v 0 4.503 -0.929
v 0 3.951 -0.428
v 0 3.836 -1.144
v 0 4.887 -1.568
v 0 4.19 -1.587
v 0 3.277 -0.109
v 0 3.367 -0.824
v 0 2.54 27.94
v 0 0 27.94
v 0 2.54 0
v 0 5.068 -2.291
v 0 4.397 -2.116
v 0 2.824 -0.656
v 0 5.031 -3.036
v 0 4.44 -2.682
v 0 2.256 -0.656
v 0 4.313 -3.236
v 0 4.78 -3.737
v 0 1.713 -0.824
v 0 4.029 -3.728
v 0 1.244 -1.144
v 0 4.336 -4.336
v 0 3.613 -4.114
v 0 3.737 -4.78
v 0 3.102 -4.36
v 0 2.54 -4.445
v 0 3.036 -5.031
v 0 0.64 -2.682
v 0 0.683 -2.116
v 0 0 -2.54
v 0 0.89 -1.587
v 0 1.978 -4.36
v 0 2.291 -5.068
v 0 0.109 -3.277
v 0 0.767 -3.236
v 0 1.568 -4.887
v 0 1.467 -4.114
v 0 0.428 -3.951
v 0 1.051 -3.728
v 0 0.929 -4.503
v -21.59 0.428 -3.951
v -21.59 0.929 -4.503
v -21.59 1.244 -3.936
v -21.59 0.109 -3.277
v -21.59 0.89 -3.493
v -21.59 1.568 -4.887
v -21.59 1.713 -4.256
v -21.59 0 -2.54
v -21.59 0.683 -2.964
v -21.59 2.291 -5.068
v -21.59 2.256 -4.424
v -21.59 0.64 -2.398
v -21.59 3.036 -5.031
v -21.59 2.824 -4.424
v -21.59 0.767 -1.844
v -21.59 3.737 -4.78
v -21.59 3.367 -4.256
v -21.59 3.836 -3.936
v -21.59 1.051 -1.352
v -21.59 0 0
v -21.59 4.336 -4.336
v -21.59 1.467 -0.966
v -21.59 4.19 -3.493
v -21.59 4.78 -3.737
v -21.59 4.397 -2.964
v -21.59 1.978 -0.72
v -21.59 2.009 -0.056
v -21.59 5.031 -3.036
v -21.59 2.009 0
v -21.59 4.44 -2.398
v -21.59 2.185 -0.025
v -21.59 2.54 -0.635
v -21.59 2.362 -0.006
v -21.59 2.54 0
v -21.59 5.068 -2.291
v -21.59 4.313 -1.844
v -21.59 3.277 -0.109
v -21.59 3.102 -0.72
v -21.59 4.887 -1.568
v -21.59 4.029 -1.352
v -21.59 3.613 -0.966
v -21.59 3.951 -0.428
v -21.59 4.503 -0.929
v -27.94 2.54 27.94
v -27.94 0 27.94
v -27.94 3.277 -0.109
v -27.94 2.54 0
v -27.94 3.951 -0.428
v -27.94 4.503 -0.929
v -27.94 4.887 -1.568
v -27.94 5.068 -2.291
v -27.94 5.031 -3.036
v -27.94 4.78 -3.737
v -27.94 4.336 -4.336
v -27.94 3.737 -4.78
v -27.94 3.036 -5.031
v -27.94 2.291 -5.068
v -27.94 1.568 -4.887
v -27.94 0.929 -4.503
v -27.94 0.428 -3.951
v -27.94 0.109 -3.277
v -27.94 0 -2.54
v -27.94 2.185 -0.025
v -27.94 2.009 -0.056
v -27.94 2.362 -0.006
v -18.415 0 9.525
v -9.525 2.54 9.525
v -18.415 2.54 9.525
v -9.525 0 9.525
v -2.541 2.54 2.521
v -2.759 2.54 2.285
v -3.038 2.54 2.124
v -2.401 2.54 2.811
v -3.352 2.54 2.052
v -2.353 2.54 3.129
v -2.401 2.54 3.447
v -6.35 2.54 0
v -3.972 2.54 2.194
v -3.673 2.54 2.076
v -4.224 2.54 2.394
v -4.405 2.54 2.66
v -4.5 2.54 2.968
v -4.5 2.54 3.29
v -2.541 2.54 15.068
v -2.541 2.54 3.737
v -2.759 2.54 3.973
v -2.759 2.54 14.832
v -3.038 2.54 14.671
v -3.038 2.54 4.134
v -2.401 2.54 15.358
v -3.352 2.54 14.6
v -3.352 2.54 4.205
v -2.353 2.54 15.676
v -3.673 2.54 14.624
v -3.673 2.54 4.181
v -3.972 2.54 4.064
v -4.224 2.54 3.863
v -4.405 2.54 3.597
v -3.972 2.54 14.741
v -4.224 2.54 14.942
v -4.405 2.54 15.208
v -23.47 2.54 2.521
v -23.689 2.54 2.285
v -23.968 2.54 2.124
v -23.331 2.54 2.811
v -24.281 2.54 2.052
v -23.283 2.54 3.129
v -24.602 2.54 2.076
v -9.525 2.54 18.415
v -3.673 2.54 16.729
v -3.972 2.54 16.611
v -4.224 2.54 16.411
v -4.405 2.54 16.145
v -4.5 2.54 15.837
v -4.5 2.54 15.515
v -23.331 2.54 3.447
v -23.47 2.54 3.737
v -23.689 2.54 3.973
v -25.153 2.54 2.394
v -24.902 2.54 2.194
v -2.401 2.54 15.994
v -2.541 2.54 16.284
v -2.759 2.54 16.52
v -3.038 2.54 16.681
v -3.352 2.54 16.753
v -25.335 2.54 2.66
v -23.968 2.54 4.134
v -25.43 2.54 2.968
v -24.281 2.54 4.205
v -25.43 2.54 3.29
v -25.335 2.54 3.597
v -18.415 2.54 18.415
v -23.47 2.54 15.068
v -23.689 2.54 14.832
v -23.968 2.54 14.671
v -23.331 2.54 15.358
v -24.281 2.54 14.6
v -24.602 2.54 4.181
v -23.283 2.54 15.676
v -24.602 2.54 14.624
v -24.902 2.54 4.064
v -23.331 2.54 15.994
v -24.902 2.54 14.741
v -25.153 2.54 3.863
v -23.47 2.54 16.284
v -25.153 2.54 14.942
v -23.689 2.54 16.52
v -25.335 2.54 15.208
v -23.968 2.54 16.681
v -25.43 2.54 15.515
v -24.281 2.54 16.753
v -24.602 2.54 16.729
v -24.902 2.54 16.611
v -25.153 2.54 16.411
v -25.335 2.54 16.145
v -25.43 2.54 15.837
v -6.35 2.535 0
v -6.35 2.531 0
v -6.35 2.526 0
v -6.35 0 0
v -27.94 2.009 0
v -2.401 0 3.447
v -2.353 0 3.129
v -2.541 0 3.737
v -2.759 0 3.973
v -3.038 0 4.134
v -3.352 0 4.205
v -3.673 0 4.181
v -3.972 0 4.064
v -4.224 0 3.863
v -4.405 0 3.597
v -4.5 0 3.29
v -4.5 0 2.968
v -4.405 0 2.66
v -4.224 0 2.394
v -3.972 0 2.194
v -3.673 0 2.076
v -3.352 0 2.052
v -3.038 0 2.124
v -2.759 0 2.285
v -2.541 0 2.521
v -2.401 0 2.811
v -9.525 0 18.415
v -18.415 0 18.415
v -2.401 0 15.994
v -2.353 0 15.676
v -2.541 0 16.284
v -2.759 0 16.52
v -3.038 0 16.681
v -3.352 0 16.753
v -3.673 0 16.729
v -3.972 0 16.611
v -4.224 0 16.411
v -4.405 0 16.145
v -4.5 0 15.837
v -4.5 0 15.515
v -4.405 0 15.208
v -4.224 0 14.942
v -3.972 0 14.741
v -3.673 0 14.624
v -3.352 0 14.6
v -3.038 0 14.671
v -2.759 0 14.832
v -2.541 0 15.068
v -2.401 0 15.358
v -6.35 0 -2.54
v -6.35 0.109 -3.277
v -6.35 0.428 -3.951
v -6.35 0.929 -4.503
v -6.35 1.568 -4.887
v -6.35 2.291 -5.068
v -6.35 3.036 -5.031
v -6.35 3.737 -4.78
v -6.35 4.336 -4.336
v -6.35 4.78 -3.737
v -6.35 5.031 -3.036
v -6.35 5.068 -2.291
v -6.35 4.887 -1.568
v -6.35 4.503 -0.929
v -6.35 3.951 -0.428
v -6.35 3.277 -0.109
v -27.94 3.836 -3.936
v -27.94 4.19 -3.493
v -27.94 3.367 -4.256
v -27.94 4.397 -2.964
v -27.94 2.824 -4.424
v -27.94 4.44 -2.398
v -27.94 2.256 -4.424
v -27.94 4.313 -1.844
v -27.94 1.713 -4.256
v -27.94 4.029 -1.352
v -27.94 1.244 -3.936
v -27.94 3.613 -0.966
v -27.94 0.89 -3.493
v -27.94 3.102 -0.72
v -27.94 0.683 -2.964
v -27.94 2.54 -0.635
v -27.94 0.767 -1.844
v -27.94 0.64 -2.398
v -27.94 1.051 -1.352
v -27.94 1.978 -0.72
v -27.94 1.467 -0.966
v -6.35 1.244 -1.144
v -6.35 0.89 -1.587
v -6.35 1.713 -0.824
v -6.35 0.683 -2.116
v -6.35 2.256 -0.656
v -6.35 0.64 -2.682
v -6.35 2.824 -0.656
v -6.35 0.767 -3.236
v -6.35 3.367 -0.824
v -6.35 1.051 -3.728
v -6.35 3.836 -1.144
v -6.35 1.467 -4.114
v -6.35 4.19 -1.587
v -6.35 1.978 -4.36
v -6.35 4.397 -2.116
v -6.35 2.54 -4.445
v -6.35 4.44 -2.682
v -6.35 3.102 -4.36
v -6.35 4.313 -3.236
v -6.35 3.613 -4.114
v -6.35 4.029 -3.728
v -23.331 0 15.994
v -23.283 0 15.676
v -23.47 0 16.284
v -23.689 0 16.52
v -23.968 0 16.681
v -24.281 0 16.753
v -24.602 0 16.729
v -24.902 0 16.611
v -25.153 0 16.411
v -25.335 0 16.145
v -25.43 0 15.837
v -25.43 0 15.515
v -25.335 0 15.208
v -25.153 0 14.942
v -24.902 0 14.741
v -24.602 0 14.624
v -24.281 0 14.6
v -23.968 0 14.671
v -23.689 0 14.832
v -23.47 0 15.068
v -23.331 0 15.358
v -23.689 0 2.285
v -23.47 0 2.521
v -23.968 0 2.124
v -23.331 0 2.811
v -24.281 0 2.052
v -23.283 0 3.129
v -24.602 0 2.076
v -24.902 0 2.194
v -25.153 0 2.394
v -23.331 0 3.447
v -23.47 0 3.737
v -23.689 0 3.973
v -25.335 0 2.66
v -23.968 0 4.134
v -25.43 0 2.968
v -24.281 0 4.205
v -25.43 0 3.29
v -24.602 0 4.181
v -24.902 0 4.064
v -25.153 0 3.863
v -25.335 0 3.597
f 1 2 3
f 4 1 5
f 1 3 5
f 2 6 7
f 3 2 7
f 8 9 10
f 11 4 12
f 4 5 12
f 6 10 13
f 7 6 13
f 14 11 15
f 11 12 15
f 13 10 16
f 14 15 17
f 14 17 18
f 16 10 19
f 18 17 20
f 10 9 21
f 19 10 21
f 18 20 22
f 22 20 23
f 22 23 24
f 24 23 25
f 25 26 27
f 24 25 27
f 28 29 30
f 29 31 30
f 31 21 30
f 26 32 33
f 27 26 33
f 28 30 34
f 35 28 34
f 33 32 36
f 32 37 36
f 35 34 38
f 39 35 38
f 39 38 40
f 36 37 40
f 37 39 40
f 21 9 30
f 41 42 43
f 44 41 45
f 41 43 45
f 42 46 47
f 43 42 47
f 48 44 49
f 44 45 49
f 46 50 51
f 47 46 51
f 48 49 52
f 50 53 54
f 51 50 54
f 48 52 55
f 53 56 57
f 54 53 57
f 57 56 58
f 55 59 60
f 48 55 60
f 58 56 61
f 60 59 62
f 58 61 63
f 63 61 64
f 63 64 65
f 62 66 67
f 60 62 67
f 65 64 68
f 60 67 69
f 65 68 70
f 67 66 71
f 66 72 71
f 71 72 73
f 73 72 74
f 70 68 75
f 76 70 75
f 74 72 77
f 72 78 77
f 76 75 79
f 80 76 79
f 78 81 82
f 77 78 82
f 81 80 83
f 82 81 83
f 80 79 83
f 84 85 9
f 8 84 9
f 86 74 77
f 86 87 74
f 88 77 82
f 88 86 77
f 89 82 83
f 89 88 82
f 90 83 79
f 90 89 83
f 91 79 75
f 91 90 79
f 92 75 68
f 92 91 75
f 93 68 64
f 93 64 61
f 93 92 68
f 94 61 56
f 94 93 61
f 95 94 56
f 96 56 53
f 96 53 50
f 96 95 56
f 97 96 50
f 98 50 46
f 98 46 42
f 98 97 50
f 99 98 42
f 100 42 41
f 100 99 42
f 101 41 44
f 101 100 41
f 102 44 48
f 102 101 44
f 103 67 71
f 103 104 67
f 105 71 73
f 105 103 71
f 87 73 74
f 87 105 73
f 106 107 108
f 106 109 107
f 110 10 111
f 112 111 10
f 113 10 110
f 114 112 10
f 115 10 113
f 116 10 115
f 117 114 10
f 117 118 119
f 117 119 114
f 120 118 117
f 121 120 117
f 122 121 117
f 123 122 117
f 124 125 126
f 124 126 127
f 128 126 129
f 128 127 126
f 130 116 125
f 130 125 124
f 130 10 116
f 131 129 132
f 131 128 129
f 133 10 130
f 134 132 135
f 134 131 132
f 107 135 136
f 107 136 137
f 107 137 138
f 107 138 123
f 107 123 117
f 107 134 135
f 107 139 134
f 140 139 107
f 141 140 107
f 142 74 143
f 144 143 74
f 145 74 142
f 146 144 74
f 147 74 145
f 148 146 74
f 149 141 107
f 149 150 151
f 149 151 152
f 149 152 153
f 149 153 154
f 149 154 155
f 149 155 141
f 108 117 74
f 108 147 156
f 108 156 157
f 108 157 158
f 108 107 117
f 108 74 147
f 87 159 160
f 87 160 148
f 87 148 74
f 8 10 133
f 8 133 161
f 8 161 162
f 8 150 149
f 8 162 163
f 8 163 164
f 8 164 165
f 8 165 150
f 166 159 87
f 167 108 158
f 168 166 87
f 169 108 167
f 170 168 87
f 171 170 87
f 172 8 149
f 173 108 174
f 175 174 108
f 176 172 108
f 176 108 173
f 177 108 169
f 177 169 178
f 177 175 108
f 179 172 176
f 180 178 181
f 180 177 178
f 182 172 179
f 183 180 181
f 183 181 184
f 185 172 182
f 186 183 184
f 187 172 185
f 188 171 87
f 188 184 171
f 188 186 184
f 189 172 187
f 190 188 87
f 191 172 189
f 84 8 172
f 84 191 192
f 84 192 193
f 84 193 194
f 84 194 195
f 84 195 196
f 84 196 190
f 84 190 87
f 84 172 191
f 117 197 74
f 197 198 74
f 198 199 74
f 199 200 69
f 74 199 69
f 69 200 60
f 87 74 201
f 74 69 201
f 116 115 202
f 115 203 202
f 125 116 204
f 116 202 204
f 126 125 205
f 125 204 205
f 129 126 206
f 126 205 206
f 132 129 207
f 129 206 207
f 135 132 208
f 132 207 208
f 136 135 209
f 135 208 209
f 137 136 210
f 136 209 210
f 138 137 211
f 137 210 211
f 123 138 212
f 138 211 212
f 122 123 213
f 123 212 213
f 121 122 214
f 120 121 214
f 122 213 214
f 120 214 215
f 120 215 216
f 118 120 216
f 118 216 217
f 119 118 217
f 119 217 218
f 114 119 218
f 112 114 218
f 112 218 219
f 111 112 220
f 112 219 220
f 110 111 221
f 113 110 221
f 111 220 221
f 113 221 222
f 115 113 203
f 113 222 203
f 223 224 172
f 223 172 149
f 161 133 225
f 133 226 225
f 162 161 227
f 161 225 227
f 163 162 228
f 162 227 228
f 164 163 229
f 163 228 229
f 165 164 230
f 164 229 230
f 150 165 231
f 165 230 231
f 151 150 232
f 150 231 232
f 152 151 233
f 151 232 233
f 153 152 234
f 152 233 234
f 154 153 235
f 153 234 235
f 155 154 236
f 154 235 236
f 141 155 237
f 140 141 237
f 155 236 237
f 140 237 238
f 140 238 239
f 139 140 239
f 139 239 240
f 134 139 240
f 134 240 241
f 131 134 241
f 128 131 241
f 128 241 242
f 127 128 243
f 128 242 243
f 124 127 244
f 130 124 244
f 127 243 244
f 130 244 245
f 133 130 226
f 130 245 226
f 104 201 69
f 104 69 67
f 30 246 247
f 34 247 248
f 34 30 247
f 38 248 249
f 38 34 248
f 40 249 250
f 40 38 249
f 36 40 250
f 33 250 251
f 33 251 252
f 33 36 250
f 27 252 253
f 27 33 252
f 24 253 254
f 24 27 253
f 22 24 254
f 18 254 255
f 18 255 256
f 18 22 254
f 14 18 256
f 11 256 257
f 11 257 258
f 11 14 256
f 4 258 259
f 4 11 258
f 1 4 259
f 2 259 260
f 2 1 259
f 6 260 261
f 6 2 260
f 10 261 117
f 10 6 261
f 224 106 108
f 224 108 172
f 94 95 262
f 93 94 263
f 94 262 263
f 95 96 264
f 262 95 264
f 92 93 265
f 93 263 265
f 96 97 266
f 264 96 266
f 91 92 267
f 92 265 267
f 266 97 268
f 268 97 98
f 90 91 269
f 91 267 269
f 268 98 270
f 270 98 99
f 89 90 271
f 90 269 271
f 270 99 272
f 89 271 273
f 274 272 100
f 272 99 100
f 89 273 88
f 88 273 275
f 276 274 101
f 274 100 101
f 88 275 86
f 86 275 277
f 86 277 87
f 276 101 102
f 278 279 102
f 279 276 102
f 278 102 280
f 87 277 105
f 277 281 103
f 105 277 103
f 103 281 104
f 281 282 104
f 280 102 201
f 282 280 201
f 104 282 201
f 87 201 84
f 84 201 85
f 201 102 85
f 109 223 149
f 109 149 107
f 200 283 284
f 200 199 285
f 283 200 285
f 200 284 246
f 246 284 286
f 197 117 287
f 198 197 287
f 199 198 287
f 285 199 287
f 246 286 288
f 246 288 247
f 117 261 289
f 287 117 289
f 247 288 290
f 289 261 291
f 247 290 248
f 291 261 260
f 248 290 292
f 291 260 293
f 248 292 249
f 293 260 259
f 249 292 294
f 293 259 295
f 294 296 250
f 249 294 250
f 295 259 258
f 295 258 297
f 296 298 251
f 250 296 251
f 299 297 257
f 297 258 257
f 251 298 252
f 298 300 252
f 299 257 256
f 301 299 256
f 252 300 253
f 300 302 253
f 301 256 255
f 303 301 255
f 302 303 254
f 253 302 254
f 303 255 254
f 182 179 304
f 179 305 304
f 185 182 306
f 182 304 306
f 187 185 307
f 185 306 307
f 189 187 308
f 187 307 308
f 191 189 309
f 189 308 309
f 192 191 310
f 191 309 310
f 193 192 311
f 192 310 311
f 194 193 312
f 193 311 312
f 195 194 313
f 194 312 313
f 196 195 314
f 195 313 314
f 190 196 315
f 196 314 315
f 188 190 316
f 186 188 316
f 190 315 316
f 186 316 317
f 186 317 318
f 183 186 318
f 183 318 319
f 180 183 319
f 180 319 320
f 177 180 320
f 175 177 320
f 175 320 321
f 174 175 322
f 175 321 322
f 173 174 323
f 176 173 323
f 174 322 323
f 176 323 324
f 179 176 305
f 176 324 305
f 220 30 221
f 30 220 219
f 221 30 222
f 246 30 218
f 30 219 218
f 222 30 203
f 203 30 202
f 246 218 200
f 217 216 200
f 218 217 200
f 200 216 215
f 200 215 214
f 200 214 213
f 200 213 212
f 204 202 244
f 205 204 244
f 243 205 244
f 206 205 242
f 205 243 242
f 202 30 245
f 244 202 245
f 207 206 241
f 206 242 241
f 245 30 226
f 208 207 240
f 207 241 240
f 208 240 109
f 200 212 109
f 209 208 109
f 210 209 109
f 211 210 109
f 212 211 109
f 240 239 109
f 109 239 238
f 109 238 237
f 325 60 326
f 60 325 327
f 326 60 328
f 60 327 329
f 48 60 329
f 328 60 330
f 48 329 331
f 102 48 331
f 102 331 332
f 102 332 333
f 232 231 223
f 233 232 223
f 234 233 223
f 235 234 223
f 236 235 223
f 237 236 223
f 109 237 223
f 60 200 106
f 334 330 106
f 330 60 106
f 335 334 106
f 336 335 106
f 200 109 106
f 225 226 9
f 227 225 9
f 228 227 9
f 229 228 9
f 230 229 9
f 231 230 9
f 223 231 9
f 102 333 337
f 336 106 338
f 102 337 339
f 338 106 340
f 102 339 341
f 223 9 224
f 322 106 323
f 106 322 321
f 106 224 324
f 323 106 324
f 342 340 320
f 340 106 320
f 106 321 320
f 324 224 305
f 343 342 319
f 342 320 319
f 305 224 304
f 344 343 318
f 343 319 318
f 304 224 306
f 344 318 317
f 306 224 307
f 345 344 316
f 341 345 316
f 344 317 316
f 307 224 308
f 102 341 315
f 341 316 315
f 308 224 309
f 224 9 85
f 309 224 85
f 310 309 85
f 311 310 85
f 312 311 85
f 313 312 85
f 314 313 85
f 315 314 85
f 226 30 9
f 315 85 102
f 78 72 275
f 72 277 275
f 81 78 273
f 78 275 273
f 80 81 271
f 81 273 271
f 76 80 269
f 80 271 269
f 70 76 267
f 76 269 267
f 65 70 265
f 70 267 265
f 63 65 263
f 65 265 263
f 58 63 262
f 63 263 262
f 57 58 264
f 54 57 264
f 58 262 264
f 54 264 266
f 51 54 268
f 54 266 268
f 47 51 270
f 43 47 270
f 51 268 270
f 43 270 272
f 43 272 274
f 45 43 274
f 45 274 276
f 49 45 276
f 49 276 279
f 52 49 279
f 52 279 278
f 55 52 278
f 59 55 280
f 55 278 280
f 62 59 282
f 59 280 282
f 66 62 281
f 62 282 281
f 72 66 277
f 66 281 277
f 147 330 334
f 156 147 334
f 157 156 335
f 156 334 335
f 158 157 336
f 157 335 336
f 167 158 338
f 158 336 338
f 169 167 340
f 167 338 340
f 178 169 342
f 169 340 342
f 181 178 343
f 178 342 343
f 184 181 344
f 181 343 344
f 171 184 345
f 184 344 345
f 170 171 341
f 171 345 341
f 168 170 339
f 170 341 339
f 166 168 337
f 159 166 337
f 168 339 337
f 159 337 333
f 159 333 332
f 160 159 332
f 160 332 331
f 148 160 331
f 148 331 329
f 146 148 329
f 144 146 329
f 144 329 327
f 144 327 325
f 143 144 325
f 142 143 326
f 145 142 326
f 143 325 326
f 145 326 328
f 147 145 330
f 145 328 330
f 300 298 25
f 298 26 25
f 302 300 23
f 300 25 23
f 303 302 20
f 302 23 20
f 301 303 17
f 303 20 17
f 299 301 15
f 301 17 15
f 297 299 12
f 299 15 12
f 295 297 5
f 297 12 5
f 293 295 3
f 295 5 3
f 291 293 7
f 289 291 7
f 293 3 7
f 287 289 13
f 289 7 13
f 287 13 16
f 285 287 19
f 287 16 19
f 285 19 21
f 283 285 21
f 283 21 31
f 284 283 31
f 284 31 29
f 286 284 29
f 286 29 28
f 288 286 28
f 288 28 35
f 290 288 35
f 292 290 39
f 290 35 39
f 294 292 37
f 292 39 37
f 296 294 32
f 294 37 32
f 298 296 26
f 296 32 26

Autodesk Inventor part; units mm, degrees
ref_plane "YZ Plane" through (0, 0, 0) normal (1, 0, 0) x (0, 1, 0)
ref_plane "XZ Plane" through (0, 0, 0) normal (0, 1, 0) x (-1, 0, 0)
sketch "Sketch1" plane through (0, 0, 0) normal (0, 1, 0) x (-1, 0, 0)
  line L0 (0, 0) -> (27.94, 0)
  line L1 (27.94, 0) -> (27.94, 27.94)
  line L2 (27.94, 27.94) -> (0, 27.94)
  line L3 (0, 27.94) -> (0, 0)
  line L4 (18.415, 18.415) -> (9.525, 18.415)
  line L5 (9.525, 18.415) -> (9.525, 9.525)
  line L6 (9.525, 9.525) -> (18.415, 9.525)
  line L7 (18.415, 9.525) -> (18.415, 18.415)
  line L8 (27.94, 0) -> (18.415, 9.525)
  line L9 (9.525, 18.415) -> (0, 27.94)
  line L10 (27.94, 27.94) -> (18.415, 18.415)
  line L11 (9.525, 9.525) -> (0, 0)
  dimension "d0" = 27.94
  dimension "d1" = 8.89
extrude "Extrusion1" add sketch "Sketch1" along normal blind 2.54 contours L11 L6 L8 L0 | L3 L9 L5 L11 | L8 L7 L10 L1 | L2 L10 L4 L9
sketch "Sketch2" plane through (0, 0, 27.94) normal (1, 0, 0) x (0, 0, -1)
  circle A0 centre (30.48, 2.54) radius 2.54
  line L0 (27.94, 0) -> (30.48, 0)
  line L1 (27.94, 2.5262) -> (27.94, 0)
  circle A1 centre (30.48, 2.54) radius 1.905
  line L2 (0, 0) -> (27.94, 0) projected
  line L3 (27.94, 0) -> (27.94, 2.54) projected
  line L4 (27.94, 2.54) -> (27.94, 0)
  line L5 (27.94, 0) -> (30.48, 0)
  line L6 (27.94, 2.54) -> (28.575, 2.54)
  line L7 (28.575, 2.54) -> (28.575, 0)
  line L8 (28.575, 0) -> (27.94, 0)
  line L9 (27.94, 0) -> (27.94, 2.54)
  line L10 (30.48, 0.635) -> (27.94, 0.635)
  line L11 (27.94, 0.635) -> (27.94, 0)
  line L12 (27.94, 0) -> (30.48, 0)
  line L13 (30.48, 0) -> (30.48, 0.635)
  line L14 (28.9005, 1.0162) -> (28.3369, 1.0162)
  line L15 (28.3369, 1.0162) -> (28.3369, 0.4026)
  line L16 (28.3369, 0.4026) -> (28.9005, 0.4026)
  line L17 (28.9005, 0.4026) -> (28.9005, 1.0162)
  dimension "d4" = 5.08
  dimension "d5" = 3.81
sketch "Sketch3" plane through (-27.94, 0, 0) normal (-1, 0, 0) x (0, 0, 1)
  circle A0 centre (-2.54, 2.54) radius 1.905
  circle A1 centre (-2.54, 2.54) radius 2.54
  line L0 (-0.3403, 2.54) -> (-0.3403, 0)
  line L1 (0, 2.54) -> (0, 0) projected
  line L2 (-0.3403, 0) -> (0, 0)
  line L3 (0, 0) -> (0, 2.54)
  line L4 (0, 2.54) -> (-0.3403, 2.54)
  line L5 (0, 0) -> (-5.4168, 0)
  line L6 (0, 0) -> (0, 2.54) projected
  line L7 (0, 2.0092) -> (-0.6973, 2.0092)
  line L8 (-0.6973, 2.0092) -> (-0.6973, 0)
  line L9 (-0.6973, 0) -> (0, 0)
  line L10 (0, 0) -> (0, 2.0092)
  line L11 (-2.54, 0.635) -> (0, 0.635)
  line L12 (0, 0.635) -> (0, 0)
  line L13 (0, 0) -> (-2.54, 0)
  line L14 (-2.54, 0) -> (-2.54, 0.635)
  line L15 (-1.27, 1.1201) -> (0, 1.1201)
  line L16 (0, 1.1201) -> (0, 0)
  line L17 (0, 0) -> (-1.27, 0)
  line L18 (-1.27, 0) -> (-1.27, 1.1201)
  point P0 (0, 1.27)
  dimension "d10" = 5.08
  dimension "d11" = 3.81
ref_plane "Work Plane1" through (-6.35, 0, 0) normal (0, 0, -1) x (-1, 0, 0)
sketch "Sketch5" plane through (0, 0, 0) normal (0, -1, 0) x (1, 0, 0)
  circle A0 centre (-24.3621, 3.1287) radius 1.0795
  circle A1 centre (-24.3621, 3.1287) radius 1.0795 projected
  circle A2 centre (-3.4325, 3.1287) radius 1.0795
  circle A3 centre (-3.4325, 15.6763) radius 1.0795
  circle A4 centre (-24.3621, 15.6763) radius 1.0795
  circle A5 centre (-3.4325, 15.6763) radius 1.0795
  circle A6 centre (-3.4325, 3.1287) radius 1.0795
  circle A7 centre (-24.3621, 3.1287) radius 1.0795
  circle A8 centre (-24.3621, 15.6763) radius 1.0795
  point P0 (0, 0)
extrude "Extrusion5" cut sketch "Sketch5" against normal blind 6.0325
extrude "Extrusion6" add sketch "Sketch2" against normal blind 6.35 contours A0 L13 A1 L6 | L6 L7 L14 A0 | L0 L7 L16 L17 A0 | A0 L17 L10 L13 | A0 L14 L15 L10 L1 | A1 L10 L17 L14 L7 | L17 L16 L7 L10 A0 | A0 L10 L17 | L0 L1 L10 L15 L16 L7 | L14 L7 A0 | A0 L7 L10 L15 L14 | L14 L17 L10 A0 L7 | L10 L7 A0 | L16 L15 L10 L7
extrude "Extrusion7" add sketch "Sketch3" against normal blind 6.35 contours A0 L14 A1 L4 L0 L7 L8 L15 | A0 L18 L11 | L11 L18 A1 L14 | L15 L8 A1 L11 L18 | L11 A1 L18 | A1 L18 L5 | L15 A1 L8 | L8 L7 L0 A1 L15 | L11 L8 L5 L18 A1 | A1 L8 L11 | A1 L7 L0 L4 | A1 L15 L0 L11 L8 | A1 L0 L15 | L11 L0 L5 L8 | L7 L1 L15 L0 A1 | A1 L0 L7 | L15 L1 L11 L0 | L11 L1 L2 L0
properties part number "Top of the cam case (real version)"
